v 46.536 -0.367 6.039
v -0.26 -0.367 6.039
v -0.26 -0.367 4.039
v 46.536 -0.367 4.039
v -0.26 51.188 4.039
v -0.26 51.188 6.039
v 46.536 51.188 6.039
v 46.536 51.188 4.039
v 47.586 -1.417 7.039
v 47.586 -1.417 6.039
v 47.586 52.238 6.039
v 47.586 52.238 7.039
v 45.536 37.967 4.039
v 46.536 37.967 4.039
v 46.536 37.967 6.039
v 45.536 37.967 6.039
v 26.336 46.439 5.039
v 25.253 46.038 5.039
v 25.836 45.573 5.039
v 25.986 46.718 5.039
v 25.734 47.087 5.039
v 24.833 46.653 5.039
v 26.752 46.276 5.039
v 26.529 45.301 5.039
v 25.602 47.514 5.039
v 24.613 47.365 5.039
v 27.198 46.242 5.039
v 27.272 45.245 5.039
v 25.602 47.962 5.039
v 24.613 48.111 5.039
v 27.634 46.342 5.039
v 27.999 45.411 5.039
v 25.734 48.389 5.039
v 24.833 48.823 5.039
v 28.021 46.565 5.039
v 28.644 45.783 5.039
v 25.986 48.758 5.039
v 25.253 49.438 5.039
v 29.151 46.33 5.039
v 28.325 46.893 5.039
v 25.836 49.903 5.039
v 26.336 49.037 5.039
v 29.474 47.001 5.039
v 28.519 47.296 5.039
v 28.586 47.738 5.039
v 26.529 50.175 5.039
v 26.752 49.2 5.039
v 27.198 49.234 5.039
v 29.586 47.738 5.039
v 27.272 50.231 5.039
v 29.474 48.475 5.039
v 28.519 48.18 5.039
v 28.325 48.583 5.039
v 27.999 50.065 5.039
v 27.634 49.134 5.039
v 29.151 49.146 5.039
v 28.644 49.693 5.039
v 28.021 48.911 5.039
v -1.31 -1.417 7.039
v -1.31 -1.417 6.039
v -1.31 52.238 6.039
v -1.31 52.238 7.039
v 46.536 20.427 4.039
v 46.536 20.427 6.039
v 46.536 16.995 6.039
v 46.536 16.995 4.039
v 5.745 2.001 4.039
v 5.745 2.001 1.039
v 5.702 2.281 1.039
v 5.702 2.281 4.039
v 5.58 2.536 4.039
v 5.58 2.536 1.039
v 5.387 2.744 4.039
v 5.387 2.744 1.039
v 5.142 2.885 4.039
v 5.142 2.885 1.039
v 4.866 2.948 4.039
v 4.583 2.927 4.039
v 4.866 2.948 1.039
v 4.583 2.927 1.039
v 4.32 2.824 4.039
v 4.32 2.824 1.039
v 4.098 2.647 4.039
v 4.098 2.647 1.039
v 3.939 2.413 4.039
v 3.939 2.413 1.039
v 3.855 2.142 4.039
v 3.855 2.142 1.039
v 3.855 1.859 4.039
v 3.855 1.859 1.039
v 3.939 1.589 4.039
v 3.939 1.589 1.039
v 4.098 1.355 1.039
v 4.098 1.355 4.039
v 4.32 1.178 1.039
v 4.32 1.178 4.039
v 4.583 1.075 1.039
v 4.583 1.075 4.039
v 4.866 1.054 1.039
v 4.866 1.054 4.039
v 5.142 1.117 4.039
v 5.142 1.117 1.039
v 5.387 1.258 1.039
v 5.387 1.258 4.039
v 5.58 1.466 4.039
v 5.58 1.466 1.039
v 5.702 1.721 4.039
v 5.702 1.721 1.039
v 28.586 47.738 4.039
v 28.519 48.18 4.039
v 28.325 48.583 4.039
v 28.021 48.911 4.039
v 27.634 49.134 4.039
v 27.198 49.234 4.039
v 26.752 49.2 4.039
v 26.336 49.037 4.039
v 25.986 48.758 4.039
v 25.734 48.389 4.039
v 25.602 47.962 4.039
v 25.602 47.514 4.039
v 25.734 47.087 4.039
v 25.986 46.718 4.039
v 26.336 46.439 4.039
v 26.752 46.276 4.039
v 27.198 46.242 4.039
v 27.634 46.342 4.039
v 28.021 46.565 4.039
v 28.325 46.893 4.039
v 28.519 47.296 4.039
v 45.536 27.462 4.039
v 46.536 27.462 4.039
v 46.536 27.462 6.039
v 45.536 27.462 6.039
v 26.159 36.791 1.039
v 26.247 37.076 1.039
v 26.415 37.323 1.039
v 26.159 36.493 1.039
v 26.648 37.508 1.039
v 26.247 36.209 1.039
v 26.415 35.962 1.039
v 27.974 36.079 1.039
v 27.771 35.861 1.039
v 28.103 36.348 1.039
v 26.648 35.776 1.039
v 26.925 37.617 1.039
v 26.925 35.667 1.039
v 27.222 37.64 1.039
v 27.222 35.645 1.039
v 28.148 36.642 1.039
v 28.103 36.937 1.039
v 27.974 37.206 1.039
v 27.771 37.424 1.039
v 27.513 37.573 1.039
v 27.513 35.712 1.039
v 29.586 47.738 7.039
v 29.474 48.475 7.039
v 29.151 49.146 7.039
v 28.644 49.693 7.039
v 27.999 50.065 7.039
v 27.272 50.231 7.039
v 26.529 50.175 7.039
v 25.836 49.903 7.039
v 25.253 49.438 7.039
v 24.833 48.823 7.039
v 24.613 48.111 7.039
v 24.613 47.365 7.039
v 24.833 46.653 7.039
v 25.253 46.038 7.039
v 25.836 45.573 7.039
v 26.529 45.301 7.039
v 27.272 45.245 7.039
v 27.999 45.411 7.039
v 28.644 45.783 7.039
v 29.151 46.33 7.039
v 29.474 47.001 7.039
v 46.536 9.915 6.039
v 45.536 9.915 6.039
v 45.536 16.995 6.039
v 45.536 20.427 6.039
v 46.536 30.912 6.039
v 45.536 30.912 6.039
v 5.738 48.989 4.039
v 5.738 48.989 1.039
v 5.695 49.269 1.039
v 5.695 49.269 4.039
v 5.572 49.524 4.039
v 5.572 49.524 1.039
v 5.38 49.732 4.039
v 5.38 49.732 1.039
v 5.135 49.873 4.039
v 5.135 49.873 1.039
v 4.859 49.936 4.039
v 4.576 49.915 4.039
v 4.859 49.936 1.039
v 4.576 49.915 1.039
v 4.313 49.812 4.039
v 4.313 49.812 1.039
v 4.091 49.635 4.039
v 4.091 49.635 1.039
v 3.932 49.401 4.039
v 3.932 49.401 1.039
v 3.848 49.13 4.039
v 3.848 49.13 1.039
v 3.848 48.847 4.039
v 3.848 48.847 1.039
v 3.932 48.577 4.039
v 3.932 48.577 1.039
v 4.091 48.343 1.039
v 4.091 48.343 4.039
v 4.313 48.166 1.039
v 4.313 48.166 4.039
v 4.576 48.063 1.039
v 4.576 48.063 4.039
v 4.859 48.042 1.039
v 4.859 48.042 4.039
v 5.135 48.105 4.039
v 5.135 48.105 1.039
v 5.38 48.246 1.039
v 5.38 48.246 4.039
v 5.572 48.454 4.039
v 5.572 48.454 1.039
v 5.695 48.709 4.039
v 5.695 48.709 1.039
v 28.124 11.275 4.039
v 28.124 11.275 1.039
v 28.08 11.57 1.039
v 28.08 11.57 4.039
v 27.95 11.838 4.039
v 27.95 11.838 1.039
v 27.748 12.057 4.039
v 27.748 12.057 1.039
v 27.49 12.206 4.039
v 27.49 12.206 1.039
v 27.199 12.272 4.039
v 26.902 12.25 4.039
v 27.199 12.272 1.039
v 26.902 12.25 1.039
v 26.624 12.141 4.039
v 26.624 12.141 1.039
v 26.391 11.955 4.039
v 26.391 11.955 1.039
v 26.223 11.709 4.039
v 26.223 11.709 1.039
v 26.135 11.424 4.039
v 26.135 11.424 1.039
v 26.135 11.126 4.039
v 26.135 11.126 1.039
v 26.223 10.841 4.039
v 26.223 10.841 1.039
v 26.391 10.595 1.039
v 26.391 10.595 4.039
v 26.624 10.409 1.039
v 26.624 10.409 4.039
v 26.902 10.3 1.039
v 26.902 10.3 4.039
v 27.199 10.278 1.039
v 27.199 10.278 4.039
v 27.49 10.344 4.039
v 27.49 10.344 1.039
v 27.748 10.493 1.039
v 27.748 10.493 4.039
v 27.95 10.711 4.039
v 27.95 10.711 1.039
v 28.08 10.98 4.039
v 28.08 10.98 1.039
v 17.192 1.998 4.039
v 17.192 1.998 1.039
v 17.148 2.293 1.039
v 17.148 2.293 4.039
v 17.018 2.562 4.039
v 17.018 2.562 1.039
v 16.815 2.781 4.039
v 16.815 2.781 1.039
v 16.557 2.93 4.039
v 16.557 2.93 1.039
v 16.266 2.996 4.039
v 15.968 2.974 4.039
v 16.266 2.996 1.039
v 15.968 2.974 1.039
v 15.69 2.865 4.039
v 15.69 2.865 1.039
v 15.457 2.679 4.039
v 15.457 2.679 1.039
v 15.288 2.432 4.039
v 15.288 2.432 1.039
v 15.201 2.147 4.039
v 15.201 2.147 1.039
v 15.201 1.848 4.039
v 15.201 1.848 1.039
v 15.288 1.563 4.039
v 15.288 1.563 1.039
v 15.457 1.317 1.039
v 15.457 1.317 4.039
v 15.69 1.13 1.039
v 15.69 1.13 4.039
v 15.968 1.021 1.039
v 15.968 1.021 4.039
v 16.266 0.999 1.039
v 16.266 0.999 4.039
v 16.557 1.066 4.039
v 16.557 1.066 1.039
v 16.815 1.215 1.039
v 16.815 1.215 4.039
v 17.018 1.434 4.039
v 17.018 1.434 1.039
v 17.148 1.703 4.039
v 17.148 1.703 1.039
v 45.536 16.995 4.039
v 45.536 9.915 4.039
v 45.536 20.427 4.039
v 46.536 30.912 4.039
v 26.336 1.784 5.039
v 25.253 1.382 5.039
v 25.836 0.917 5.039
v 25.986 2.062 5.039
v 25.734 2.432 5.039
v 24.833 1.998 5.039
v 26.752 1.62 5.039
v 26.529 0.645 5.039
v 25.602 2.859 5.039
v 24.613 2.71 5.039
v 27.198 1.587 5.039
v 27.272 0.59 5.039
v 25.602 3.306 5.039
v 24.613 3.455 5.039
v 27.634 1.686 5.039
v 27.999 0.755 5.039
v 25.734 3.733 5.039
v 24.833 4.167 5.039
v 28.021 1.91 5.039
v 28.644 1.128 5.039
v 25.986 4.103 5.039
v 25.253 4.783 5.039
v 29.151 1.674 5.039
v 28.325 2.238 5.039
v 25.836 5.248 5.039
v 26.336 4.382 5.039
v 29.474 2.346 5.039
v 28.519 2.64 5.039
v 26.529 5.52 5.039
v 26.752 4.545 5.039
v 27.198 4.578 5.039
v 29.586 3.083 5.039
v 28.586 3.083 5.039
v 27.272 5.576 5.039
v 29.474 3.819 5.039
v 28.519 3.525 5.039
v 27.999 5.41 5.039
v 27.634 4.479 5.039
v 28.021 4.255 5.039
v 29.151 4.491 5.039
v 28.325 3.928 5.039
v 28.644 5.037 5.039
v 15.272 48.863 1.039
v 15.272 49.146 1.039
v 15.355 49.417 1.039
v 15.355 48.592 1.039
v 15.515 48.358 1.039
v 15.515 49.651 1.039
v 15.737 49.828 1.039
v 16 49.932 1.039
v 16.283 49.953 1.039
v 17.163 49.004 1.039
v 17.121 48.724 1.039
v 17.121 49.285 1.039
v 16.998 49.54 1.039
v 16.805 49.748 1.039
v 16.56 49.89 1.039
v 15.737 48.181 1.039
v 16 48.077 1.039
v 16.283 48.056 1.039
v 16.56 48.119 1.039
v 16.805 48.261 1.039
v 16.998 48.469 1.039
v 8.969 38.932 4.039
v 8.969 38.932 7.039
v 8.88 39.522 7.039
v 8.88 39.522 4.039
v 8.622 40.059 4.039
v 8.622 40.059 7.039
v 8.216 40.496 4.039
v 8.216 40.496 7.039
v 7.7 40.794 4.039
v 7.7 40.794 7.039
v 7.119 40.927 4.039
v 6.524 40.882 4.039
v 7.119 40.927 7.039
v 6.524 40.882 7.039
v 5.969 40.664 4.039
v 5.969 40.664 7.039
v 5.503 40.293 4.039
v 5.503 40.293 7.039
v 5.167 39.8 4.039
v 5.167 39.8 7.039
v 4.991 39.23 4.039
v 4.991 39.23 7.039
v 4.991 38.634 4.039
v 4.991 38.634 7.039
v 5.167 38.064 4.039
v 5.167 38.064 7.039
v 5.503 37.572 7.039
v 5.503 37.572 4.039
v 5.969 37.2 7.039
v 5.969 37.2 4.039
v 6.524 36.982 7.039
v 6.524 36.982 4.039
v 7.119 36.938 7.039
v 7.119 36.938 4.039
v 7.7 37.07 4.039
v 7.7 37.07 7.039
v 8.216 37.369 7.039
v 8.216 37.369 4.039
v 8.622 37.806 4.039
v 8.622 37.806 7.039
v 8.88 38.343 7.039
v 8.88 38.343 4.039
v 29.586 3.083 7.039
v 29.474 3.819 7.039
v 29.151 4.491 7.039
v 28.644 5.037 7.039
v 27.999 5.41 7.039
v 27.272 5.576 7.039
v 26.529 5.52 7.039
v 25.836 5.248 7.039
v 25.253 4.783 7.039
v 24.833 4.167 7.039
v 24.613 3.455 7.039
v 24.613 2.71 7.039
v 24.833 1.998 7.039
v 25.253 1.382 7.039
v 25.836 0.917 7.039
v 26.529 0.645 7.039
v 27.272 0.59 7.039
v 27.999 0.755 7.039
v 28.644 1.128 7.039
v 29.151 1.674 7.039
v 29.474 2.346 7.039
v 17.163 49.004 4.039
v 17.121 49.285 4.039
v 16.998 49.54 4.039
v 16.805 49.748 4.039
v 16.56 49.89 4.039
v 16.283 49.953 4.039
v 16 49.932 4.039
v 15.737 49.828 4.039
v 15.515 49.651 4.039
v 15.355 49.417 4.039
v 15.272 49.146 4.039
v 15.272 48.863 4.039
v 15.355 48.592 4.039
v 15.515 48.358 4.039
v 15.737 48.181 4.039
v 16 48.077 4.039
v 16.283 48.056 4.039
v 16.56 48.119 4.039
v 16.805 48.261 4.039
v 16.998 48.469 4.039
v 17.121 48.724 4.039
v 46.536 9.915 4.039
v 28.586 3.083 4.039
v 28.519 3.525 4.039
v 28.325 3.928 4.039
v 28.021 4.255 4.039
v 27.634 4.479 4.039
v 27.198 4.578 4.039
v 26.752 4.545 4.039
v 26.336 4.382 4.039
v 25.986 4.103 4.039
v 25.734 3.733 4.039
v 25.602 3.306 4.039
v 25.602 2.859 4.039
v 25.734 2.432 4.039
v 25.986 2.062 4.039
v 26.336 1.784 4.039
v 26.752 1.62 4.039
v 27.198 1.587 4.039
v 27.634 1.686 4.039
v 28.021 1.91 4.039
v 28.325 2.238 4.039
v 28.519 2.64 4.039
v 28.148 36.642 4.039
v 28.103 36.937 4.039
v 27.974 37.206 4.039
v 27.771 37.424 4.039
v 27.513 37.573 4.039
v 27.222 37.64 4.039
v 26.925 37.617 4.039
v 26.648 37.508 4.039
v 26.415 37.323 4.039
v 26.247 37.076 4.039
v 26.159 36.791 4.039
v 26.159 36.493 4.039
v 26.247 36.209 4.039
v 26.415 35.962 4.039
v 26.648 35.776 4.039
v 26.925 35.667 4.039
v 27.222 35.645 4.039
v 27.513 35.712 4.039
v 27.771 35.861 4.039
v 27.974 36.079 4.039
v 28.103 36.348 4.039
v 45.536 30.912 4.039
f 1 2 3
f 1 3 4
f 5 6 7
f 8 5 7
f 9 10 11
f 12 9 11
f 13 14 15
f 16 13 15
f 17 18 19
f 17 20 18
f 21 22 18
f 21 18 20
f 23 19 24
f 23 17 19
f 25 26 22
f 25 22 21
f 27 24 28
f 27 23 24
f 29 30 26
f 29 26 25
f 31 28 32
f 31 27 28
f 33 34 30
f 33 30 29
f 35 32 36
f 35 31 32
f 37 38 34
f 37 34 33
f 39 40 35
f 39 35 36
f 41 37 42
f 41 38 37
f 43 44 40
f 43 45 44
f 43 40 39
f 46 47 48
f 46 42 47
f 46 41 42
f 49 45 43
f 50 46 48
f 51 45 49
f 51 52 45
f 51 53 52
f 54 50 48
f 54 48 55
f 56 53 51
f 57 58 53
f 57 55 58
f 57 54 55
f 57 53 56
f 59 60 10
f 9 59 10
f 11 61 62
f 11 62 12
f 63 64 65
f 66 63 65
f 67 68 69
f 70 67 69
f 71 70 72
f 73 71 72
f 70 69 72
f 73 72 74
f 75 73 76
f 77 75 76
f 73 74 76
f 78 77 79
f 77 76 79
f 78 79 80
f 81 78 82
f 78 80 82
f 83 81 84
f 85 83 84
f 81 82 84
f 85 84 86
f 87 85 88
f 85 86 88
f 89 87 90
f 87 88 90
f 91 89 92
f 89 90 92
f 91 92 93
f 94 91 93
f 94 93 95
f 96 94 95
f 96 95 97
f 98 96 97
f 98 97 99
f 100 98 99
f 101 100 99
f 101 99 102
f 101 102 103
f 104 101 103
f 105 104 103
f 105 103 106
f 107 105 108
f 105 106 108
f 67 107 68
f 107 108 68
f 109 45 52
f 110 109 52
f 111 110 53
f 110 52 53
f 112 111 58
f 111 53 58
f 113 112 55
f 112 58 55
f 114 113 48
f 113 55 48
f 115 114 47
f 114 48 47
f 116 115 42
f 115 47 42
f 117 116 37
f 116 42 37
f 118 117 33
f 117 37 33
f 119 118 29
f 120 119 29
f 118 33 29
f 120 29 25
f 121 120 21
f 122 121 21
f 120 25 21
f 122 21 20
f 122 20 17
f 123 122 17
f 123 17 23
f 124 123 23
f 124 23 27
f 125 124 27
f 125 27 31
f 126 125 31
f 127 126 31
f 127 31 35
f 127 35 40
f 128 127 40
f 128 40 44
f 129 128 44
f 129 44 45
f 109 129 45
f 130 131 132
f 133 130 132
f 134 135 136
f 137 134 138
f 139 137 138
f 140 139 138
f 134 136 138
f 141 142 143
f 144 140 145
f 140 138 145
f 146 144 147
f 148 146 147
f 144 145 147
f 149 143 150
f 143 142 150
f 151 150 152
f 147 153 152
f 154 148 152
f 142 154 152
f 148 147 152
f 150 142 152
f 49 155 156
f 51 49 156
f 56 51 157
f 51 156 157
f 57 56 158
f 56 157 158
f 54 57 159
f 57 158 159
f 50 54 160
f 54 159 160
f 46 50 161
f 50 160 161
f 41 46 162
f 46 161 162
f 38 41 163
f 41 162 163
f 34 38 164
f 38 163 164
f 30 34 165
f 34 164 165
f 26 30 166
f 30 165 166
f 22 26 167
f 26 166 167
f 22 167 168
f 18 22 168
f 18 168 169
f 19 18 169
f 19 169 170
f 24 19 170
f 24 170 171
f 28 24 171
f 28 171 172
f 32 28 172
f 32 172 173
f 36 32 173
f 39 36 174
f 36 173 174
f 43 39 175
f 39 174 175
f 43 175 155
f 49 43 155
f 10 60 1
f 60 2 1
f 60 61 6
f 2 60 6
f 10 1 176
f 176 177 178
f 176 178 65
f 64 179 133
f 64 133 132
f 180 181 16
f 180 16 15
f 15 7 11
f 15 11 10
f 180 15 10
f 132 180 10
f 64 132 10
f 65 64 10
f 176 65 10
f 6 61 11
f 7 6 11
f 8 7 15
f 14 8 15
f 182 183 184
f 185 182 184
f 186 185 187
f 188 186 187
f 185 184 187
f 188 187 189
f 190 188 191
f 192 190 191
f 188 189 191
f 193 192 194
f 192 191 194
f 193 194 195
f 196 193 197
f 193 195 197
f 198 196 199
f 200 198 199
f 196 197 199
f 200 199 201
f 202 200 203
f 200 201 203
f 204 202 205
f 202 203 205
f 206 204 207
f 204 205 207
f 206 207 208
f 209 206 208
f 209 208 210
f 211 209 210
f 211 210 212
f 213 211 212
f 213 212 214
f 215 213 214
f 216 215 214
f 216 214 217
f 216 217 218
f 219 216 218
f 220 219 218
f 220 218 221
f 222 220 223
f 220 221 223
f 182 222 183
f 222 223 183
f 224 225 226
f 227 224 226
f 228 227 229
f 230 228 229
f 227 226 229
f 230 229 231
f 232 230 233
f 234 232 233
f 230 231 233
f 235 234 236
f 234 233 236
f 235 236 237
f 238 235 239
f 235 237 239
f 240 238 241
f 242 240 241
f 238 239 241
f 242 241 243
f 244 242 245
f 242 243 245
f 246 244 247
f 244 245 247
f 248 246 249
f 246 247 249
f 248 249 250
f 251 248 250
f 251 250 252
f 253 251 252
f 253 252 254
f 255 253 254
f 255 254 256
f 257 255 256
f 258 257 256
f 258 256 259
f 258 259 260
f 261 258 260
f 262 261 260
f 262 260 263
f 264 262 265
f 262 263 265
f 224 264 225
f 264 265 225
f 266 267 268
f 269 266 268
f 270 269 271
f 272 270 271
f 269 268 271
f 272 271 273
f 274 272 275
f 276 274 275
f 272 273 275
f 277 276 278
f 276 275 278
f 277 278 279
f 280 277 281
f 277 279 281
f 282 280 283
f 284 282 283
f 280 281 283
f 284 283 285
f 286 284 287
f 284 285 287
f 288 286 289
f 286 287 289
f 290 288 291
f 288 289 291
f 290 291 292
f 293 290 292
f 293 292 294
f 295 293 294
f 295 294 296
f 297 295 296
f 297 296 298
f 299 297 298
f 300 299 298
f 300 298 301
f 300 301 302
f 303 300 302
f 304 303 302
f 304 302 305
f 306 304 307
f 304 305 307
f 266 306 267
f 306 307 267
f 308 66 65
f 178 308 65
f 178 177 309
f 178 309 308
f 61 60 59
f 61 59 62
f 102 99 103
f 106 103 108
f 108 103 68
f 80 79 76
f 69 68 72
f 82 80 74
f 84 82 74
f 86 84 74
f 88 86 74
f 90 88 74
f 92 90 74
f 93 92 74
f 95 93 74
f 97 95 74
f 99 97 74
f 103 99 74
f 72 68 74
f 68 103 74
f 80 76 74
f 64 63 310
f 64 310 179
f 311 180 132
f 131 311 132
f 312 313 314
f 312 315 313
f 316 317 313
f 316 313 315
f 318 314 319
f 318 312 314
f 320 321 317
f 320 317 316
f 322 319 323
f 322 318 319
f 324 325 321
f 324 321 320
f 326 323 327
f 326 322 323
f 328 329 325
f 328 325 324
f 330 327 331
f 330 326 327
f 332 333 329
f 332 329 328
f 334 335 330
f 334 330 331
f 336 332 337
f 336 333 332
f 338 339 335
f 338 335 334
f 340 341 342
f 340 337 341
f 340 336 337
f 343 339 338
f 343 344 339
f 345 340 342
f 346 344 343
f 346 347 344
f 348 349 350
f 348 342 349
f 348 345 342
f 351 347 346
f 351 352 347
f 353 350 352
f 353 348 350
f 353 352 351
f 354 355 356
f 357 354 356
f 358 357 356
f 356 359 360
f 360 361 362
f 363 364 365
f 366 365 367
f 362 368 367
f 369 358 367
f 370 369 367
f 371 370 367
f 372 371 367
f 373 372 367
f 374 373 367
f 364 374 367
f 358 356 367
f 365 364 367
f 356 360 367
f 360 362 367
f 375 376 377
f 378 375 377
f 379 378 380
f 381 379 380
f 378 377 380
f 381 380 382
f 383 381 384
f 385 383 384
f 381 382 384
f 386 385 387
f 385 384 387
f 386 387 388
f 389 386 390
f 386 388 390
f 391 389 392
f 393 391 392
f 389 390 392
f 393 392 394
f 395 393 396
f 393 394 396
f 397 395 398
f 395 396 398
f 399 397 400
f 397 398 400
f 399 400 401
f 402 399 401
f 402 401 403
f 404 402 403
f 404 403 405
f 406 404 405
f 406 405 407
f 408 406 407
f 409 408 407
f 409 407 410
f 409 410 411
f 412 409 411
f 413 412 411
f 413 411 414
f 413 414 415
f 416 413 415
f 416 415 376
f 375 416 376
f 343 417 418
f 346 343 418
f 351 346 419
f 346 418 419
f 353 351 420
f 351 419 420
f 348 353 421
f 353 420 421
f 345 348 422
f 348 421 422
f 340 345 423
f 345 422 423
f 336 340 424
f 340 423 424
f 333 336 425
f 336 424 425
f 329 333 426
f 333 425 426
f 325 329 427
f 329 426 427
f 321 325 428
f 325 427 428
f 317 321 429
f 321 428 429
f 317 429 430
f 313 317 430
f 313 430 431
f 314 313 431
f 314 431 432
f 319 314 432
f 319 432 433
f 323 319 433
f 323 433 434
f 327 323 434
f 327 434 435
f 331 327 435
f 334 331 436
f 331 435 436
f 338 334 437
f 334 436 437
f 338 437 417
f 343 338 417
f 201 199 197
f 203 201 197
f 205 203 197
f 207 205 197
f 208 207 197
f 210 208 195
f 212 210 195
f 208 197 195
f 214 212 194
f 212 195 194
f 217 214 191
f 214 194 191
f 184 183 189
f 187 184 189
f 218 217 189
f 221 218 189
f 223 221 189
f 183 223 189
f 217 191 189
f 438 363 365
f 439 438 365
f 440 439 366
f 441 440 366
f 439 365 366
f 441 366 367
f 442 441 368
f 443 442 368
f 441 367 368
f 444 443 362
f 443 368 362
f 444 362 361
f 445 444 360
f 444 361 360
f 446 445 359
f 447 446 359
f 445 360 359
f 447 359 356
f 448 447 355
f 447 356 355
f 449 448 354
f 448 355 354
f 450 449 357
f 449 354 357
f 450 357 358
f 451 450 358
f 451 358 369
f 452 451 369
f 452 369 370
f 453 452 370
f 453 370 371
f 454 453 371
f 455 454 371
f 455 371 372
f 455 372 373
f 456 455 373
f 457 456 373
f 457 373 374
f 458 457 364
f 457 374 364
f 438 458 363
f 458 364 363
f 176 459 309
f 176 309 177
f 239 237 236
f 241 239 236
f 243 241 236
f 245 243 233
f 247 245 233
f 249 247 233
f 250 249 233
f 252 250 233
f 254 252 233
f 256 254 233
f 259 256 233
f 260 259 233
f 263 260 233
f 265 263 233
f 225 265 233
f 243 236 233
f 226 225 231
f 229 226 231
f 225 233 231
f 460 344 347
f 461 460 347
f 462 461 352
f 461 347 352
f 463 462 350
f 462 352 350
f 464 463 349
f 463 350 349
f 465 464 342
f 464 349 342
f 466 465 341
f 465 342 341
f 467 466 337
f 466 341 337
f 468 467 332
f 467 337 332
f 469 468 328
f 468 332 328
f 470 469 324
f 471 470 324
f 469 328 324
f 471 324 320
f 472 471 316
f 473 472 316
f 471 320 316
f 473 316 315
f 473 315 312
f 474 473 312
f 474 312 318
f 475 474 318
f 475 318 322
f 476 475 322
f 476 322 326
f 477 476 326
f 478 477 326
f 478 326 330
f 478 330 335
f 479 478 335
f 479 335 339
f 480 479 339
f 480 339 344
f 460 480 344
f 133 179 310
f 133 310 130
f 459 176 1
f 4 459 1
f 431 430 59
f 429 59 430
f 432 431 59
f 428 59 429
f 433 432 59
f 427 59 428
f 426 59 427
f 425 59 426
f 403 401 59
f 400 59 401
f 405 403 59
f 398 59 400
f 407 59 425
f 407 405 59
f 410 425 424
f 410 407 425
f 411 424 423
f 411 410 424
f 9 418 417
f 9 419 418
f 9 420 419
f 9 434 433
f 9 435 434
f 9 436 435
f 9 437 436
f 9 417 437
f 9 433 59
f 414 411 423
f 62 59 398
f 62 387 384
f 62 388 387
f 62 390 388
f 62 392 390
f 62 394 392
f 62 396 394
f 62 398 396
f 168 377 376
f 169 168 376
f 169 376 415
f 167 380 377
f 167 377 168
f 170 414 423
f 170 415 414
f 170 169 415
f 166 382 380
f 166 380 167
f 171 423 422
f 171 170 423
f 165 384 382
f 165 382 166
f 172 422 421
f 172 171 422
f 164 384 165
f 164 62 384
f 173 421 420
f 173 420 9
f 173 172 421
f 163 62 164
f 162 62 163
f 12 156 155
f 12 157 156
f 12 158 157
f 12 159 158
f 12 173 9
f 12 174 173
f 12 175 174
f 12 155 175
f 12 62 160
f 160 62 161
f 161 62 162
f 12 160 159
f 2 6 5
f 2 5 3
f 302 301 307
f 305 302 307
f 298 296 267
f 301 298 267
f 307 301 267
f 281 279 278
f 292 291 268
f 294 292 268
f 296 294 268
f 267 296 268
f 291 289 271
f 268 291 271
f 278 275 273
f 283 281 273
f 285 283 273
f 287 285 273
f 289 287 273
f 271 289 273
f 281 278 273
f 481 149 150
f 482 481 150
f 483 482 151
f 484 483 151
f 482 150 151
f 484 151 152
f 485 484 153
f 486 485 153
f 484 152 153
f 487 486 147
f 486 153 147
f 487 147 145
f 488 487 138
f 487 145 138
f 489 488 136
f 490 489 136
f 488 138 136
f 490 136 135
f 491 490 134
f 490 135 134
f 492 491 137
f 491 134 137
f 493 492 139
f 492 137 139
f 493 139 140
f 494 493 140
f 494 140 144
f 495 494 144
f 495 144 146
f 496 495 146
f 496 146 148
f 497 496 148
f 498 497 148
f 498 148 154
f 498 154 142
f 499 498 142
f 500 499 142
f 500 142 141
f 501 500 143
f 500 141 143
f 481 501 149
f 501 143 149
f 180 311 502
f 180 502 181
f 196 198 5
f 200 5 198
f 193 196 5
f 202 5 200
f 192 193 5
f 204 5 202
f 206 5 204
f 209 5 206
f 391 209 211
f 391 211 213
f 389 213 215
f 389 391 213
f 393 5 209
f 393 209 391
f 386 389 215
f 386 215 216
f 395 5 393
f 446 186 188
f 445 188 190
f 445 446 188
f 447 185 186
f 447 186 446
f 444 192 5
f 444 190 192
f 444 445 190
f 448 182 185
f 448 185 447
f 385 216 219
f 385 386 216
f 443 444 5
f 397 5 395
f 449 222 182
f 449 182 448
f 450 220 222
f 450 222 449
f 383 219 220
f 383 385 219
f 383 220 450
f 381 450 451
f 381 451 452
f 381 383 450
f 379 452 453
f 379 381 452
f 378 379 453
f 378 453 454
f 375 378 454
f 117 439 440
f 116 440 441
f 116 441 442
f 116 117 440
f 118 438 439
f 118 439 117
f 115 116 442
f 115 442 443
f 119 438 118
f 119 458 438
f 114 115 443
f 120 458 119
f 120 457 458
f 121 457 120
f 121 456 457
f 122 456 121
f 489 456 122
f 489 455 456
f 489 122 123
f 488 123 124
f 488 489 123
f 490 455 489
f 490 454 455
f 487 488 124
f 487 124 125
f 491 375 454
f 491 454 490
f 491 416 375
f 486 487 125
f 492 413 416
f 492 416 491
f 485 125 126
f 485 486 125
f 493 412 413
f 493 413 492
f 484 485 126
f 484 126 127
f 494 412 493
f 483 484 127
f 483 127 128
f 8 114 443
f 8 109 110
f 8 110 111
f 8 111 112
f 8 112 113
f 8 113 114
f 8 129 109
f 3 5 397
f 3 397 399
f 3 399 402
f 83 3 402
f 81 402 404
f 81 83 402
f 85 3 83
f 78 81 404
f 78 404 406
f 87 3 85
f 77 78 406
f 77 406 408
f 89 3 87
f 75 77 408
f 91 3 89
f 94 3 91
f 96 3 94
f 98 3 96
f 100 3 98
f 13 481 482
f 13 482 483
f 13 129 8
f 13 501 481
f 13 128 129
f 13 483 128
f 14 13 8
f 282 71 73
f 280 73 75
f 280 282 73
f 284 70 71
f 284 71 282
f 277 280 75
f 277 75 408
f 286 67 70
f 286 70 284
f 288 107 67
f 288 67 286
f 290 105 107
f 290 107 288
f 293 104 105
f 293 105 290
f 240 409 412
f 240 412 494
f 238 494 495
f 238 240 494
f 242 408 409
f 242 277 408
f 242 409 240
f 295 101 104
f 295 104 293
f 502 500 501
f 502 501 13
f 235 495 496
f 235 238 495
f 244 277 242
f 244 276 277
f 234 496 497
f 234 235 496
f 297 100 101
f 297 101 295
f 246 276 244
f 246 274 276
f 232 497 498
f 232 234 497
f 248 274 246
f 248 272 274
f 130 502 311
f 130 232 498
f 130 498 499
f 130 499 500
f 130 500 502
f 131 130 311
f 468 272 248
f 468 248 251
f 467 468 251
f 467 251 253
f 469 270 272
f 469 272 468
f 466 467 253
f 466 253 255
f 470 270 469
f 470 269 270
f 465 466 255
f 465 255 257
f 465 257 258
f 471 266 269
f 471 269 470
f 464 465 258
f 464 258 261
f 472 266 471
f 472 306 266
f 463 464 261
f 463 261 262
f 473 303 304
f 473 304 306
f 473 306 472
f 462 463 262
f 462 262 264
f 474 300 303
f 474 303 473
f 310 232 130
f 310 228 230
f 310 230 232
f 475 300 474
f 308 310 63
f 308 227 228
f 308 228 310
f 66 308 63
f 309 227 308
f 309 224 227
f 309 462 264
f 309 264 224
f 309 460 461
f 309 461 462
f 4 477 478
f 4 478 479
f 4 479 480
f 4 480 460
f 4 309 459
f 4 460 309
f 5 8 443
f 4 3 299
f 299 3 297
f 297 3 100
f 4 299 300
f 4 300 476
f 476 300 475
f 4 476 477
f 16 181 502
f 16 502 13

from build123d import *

# Parameters (mm, degrees)
SKETCH005_W     = 48.896005
SKETCH005_H     = 53.655467
PAD003_DEPTH    = 1
SKETCH006_W     = 46.796005
SKETCH006_H     = 51.555467
PAD004_DEPTH    = 2
SKETCH007_R     = 0.95
SKETCH007_R_2   = 1.001433
SKETCH007_R_3   = 1
SKETCH007_R_4   = 0.951025
PAD005_DEPTH    = 3
SKETCH008_R     = 2.5
POCKET002_DEPTH = 2
SKETCH009_R     = 1.5
POCKET003_DEPTH = 5
SKETCH010_W     = 7.035641
SKETCH010_H     = 2
SKETCH010_W_2   = 7.054697
SKETCH010_W_3   = 7.079575
POCKET004_DEPTH = 1
SKETCH011_R     = 2
POCKET005_DEPTH = 5


with BuildPart() as part:
    # Sketch005 (on Face1 of CopyBinder) → Pad003 (new body)
    with BuildSketch(Plane.XY.offset(6.0393)):
        with Locations((23.137507, 25.410293)):
            Rectangle(SKETCH005_W, SKETCH005_H)
    extrude(amount=PAD003_DEPTH)

    # Sketch006 (on Face5 of Pad003) → Pad004 (join)
    with BuildSketch(Plane(origin=(0, 0, 6.0393), x_dir=(1, 0, 0), z_dir=(0, 0, -1))):
        with Locations((23.137507, -25.410293)):
            Rectangle(SKETCH006_W, SKETCH006_H)
    extrude(amount=PAD004_DEPTH)

    # Sketch007 (on Face2 of Binder001) → Pad005 (join)
    with BuildSketch(Plane.XY.offset(1.0393)):
        with Locations((4.794625, 2.000882)):
            Circle(SKETCH007_R)
        with Locations((16.190751, 1.997755)):
            Circle(SKETCH007_R_2)
        with Locations((27.124204, 11.274795)):
            Circle(SKETCH007_R_3)
        with Locations((27.14775, 36.64242)):
            Circle(SKETCH007_R_3)
        with Locations((16.21209, 49.004375)):
            Circle(SKETCH007_R_4)
        with Locations((4.787556, 48.988897)):
            Circle(SKETCH007_R)
    extrude(amount=PAD005_DEPTH)

    # Sketch008 (on Face5 of Pad005) → Pocket002 (cut)
    with BuildSketch(Plane.XY.offset(7.0393)):
        with Locations((27.08551, 47.738026)):
            Circle(SKETCH008_R)
        with Locations((27.08551, 3.082559)):
            Circle(SKETCH008_R)
    extrude(amount=-POCKET002_DEPTH, mode=Mode.SUBTRACT)

    # Sketch009 (on Face14 of Pocket002) → Pocket003 (cut)
    with BuildSketch(Plane.XY.offset(5.0393)):
        with Locations((27.08551, 3.082559)):
            Circle(SKETCH009_R)
        with Locations((27.08551, 47.738026)):
            Circle(SKETCH009_R)
    extrude(amount=-POCKET003_DEPTH, mode=Mode.SUBTRACT)

    # Sketch010 (on Face8 of Pocket003) → Pocket004 (cut)
    with BuildSketch(Plane.YZ.offset(46.53551)):
        with Locations((23.944557, 5.0393)):
            Rectangle(SKETCH010_W, SKETCH010_H)
        with Locations((34.439561, 5.0393)):
            Rectangle(SKETCH010_W_2, SKETCH010_H)
        with Locations((13.454822, 5.0393)):
            Rectangle(SKETCH010_W_3, SKETCH010_H)
    extrude(amount=-POCKET004_DEPTH, mode=Mode.SUBTRACT)

    # Sketch011 (on Face4 of Pocket004) → Pocket005 (cut)
    with BuildSketch(Plane.XY.offset(7.0393)):
        with Locations((6.969133, 38.932186)):
            Circle(SKETCH011_R)
    extrude(amount=-POCKET005_DEPTH, mode=Mode.SUBTRACT)


solid = part.part
